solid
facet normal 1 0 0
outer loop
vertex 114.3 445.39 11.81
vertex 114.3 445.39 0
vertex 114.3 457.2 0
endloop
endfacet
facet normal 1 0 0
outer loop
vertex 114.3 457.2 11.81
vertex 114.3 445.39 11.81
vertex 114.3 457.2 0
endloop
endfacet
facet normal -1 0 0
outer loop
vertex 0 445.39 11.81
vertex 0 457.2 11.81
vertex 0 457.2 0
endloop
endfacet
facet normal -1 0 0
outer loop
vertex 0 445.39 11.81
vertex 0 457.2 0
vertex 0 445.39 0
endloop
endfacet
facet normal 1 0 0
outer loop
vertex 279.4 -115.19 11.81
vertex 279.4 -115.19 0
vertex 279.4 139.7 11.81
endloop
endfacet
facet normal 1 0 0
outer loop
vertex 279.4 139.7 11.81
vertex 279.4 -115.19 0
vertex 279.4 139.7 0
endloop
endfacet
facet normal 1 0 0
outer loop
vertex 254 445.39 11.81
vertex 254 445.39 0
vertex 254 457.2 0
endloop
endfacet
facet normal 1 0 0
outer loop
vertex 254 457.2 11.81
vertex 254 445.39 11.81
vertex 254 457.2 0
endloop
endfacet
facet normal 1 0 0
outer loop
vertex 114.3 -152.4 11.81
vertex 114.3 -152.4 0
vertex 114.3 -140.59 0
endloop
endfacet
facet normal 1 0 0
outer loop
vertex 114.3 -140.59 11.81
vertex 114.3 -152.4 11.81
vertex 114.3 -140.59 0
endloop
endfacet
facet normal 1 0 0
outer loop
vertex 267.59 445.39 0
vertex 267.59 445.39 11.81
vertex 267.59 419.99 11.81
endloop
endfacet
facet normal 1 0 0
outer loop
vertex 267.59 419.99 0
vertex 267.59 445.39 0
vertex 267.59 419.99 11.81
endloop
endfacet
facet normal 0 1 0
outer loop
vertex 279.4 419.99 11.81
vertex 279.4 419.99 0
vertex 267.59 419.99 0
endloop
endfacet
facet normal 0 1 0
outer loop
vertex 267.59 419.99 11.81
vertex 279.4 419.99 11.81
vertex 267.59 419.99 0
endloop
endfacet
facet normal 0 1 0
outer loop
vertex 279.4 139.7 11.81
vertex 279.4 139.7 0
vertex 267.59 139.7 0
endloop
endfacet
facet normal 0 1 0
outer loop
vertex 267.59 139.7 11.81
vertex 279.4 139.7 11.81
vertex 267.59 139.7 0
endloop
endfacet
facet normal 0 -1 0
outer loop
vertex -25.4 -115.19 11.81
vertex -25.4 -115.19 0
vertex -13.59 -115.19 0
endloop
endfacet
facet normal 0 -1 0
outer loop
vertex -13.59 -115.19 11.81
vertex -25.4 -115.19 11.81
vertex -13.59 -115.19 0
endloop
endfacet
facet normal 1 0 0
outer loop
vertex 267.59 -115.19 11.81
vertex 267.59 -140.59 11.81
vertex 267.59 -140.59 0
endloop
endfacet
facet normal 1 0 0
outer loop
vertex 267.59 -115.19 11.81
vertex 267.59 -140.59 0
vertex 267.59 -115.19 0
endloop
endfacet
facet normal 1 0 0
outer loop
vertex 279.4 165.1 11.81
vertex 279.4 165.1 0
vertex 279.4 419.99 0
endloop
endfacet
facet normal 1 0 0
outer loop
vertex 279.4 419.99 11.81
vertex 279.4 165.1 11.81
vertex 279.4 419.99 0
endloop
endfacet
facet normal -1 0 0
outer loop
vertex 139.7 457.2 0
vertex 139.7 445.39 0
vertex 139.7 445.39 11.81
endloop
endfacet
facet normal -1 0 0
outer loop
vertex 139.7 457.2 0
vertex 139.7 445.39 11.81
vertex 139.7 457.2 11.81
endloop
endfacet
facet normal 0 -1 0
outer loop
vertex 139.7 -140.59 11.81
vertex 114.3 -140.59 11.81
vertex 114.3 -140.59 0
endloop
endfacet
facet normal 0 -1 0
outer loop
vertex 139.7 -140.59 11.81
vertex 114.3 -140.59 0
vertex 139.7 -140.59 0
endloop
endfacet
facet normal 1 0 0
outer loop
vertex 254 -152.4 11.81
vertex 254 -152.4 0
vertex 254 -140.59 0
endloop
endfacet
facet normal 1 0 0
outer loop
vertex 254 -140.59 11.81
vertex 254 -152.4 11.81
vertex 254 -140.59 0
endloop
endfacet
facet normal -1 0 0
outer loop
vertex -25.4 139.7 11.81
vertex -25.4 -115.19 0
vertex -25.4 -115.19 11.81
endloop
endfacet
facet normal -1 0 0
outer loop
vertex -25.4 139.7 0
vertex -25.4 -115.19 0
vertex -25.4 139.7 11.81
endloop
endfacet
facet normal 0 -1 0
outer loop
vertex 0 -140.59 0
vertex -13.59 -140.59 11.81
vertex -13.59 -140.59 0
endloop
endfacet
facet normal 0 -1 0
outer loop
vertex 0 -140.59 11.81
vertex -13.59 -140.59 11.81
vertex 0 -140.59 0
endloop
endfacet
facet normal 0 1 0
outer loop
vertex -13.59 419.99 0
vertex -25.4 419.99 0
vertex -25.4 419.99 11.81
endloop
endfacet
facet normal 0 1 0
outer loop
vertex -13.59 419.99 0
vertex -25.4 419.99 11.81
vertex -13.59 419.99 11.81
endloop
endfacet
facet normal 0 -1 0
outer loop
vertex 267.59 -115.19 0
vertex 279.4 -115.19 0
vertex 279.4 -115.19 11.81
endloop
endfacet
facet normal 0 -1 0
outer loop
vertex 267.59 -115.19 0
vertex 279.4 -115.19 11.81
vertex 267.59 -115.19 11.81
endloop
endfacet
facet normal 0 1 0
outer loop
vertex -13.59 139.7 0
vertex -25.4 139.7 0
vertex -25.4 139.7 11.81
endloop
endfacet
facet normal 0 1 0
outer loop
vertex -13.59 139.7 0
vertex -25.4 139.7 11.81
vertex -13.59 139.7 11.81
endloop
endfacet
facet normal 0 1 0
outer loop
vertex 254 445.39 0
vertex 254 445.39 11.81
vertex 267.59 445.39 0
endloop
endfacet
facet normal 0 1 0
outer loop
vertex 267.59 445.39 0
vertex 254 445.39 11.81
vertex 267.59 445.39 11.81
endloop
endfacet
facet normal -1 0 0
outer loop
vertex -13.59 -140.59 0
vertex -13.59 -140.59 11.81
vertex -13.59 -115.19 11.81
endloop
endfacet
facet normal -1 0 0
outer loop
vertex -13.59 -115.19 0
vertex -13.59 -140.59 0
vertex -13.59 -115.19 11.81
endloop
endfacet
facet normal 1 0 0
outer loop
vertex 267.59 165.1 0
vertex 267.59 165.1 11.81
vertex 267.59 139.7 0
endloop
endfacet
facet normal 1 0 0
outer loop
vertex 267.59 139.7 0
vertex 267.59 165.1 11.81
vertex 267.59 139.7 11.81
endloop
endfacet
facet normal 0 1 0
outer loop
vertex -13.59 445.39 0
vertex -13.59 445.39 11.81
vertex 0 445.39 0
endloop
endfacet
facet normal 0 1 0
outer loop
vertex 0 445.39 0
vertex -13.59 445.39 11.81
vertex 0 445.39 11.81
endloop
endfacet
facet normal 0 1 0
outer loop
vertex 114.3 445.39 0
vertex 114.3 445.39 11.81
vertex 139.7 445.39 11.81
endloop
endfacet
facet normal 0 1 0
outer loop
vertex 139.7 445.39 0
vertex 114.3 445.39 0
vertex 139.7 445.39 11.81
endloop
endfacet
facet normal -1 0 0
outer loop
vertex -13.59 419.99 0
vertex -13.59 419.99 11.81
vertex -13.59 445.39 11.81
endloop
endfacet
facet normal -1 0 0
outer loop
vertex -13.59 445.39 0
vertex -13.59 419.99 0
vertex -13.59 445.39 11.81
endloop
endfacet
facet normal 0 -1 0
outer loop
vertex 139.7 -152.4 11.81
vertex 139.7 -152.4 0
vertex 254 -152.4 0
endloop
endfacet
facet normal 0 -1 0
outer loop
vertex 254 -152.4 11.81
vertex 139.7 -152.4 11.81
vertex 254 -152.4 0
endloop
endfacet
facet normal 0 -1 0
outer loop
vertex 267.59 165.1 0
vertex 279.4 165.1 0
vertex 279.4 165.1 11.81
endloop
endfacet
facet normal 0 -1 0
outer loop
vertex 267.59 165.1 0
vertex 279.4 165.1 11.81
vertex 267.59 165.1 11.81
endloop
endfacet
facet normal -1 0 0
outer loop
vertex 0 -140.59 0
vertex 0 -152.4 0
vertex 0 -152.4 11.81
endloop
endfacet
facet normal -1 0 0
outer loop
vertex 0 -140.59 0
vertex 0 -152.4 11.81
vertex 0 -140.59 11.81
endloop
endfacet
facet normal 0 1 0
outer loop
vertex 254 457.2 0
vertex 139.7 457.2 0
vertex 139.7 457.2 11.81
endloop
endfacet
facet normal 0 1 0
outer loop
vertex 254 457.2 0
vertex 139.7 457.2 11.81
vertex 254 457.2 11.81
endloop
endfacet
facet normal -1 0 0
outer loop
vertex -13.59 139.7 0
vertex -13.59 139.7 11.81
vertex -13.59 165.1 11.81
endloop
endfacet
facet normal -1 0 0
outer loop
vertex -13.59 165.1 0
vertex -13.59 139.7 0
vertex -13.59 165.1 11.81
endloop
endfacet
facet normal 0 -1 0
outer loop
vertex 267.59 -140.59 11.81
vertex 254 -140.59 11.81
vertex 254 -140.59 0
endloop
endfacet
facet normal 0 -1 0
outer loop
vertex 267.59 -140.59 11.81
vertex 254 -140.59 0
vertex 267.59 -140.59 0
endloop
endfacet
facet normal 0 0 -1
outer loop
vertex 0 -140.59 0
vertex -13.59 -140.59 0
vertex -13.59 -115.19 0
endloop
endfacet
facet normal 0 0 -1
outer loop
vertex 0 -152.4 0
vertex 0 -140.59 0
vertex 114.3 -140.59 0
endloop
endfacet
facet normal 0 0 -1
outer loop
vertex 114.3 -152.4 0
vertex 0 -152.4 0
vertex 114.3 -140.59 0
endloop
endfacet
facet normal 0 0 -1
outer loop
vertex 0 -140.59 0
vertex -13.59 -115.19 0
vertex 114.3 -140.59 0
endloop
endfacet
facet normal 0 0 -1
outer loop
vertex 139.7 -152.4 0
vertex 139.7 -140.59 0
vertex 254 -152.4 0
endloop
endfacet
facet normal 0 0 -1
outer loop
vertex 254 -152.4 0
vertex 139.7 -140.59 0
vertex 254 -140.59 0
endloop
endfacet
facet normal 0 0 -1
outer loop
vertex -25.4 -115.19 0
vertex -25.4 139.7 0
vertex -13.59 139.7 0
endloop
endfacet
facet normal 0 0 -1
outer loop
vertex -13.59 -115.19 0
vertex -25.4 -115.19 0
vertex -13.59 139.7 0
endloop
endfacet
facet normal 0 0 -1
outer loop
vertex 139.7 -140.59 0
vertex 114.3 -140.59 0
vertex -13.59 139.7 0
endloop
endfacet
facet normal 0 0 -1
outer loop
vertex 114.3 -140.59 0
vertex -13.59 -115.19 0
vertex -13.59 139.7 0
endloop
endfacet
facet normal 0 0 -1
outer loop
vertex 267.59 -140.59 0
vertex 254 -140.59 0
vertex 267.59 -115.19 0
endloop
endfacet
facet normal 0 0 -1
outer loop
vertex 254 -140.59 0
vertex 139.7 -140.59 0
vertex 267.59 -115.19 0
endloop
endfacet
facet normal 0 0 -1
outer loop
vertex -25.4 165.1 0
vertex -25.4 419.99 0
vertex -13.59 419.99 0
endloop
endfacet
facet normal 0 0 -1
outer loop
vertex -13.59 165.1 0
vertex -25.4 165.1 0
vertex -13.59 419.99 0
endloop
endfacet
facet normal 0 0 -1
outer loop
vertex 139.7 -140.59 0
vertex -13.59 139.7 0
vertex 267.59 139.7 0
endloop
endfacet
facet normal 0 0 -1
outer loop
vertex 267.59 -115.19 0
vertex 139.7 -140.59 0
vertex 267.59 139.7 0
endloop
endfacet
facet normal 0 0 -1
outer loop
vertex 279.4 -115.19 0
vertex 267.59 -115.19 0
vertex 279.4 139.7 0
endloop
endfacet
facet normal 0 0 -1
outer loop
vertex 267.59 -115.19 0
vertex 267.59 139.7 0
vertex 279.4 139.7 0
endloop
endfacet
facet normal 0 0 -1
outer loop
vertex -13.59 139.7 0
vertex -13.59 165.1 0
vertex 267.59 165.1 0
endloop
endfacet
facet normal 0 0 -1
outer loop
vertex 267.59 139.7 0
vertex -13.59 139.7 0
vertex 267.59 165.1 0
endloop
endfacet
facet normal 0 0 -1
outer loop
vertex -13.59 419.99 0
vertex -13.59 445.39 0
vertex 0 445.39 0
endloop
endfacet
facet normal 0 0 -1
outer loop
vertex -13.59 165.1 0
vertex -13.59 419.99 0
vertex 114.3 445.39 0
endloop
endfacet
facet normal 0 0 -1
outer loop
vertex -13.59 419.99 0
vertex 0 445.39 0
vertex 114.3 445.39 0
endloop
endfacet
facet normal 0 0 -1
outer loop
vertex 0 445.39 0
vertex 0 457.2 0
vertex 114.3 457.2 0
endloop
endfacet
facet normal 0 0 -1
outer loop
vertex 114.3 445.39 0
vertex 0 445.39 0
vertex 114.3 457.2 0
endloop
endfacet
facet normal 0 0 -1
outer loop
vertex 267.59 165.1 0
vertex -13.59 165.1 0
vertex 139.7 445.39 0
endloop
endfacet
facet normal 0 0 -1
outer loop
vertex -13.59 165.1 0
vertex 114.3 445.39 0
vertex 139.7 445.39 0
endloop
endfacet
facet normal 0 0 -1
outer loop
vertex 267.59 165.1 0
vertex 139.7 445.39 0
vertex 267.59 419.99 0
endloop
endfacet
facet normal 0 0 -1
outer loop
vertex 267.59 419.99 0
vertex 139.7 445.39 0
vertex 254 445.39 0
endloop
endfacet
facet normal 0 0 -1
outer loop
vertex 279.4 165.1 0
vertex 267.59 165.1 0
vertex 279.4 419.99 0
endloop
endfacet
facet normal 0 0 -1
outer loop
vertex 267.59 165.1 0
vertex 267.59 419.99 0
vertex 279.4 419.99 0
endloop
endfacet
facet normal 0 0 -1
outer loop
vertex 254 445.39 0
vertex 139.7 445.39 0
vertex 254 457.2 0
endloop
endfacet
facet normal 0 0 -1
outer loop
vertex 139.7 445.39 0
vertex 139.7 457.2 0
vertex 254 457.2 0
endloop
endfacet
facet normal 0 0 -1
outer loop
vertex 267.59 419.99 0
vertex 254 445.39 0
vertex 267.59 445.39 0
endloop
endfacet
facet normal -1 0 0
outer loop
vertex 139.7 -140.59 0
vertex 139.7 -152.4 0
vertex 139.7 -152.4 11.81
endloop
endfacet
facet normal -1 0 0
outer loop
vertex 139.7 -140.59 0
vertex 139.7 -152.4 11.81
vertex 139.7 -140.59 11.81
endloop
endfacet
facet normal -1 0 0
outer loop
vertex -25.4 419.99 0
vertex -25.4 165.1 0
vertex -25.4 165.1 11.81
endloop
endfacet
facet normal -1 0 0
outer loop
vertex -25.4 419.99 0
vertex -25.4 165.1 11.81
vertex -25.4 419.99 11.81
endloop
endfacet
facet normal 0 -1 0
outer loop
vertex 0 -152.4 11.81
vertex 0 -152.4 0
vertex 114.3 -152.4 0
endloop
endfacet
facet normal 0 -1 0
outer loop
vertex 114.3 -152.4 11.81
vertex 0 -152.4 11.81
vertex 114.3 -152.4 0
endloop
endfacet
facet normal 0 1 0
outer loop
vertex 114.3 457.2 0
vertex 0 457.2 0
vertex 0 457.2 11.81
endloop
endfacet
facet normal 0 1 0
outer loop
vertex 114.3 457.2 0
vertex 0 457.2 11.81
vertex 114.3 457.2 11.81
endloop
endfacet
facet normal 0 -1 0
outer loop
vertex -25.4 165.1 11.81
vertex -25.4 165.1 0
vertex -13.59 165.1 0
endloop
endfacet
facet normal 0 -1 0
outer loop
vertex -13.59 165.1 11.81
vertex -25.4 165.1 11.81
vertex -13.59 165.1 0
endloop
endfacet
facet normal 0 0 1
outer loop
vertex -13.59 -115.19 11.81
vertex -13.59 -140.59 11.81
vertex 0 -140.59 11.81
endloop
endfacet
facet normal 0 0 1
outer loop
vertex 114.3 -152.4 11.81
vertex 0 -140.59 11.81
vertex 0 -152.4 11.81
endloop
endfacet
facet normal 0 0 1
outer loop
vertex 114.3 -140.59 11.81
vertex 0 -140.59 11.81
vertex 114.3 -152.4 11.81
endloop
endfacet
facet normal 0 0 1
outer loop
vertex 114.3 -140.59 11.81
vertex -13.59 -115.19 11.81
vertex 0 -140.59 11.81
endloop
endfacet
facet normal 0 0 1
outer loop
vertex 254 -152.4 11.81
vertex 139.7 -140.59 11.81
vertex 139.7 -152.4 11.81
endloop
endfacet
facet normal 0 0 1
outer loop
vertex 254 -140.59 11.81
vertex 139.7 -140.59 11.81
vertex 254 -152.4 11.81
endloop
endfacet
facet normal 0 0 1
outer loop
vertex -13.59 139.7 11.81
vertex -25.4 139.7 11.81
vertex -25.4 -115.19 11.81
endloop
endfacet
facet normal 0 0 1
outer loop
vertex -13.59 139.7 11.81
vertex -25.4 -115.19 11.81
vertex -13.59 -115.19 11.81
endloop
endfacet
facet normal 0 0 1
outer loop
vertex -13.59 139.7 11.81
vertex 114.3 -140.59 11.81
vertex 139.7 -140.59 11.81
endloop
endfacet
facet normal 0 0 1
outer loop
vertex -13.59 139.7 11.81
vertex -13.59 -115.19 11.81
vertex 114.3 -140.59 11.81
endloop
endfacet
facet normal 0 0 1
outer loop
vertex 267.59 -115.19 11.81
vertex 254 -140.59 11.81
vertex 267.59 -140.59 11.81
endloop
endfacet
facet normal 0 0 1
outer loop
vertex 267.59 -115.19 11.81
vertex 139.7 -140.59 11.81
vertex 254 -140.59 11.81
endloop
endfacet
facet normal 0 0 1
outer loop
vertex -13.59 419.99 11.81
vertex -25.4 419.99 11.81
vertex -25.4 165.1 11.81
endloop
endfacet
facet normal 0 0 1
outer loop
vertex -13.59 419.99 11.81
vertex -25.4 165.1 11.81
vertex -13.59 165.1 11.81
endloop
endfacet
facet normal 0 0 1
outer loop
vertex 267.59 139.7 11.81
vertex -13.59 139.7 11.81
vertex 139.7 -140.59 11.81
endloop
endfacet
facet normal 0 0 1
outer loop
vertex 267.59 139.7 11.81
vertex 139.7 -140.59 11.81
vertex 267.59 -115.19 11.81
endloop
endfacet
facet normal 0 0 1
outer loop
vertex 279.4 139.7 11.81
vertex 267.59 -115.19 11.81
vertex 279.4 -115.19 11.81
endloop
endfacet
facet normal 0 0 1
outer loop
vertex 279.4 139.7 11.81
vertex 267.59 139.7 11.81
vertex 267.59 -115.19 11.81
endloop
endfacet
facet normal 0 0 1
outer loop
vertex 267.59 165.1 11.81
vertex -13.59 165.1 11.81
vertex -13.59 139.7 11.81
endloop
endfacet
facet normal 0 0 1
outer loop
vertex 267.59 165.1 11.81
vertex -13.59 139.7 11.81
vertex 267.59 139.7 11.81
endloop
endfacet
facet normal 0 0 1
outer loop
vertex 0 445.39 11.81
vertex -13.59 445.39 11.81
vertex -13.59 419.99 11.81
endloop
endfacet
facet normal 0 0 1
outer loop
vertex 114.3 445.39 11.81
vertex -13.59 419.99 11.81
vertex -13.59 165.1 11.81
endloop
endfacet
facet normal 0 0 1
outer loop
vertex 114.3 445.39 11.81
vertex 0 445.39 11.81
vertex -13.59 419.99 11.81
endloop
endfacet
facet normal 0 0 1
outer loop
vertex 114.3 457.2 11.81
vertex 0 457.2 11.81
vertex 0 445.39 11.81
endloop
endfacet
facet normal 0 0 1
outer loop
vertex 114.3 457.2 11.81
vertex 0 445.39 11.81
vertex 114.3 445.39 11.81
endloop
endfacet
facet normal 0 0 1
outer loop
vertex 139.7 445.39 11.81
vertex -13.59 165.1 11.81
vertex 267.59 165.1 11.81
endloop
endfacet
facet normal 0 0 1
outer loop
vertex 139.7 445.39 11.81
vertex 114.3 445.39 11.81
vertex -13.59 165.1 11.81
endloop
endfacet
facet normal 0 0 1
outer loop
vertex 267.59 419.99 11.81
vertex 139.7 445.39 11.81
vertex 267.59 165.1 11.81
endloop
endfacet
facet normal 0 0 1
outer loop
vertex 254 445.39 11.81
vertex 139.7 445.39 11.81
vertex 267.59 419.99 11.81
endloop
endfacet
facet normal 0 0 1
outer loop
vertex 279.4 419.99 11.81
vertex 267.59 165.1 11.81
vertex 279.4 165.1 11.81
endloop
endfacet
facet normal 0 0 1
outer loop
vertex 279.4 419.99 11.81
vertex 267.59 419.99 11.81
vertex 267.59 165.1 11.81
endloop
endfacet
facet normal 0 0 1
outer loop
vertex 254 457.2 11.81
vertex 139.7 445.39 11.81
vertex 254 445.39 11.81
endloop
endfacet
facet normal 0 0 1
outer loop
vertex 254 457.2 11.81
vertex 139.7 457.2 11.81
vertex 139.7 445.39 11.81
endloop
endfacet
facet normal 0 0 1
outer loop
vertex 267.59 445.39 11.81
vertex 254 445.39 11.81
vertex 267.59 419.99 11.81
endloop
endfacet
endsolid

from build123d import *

# Parameters (mm, degrees)
BASE_SKETCH_W           = 304.8
BASE_SKETCH_H           = 609.6
BOSS_EXTRUDE1_DEPTH     = 11.81
JOINT_X_W               = 25.4
JOINT_X_H               = 11.81
CUT_EXTRUDE1_DEPTH      = 536.943693755
LPATTERN1_COUNT         = 3
LPATTERN1_PITCH         = 139.7
MIRROR1_COPY_1_SKETCH_W = 25.4
MIRROR1_COPY_1_SKETCH_H = 11.81
MIRROR1_COPY_1_DEPTH    = 536.943693755
MIRROR1_COPY_2_SKETCH_W = 25.4
MIRROR1_COPY_2_SKETCH_H = 11.81
MIRROR1_COPY_2_DEPTH    = 536.943693755
JOINT_Y_W               = 11.81
JOINT_Y_H               = 25.4
CUT_EXTRUDE2_DEPTH      = 536.943693755
LPATTERN3_COUNT         = 3
LPATTERN3_PITCH         = 280.29
MIRROR4_COPY_1_SKETCH_W = 11.81
MIRROR4_COPY_1_SKETCH_H = 25.4
MIRROR4_COPY_1_DEPTH    = 536.943693755
MIRROR4_COPY_2_SKETCH_W = 11.81
MIRROR4_COPY_2_SKETCH_H = 25.4
MIRROR4_COPY_2_DEPTH    = 536.943693755


with BuildPart() as part:
    # Base_Sketch → Boss-Extrude1 (new body)
    with BuildSketch(Plane.XY):
        with Locations((127, 152.399963665)):
            Rectangle(BASE_SKETCH_W, BASE_SKETCH_H)
    extrude(amount=BOSS_EXTRUDE1_DEPTH)

    # Joint_X → Cut-Extrude1 (cut, through all)
    with BuildSketch(Plane.XY.offset(11.81)):
        with Locations((-12.7, -146.495036335)):
            Rectangle(JOINT_X_W, JOINT_X_H)
    cut_extrude1 = extrude(amount=-CUT_EXTRUDE1_DEPTH, mode=Mode.SUBTRACT)

    # LPattern1: Cut-Extrude1 ×3
    with Locations(*[(i * LPATTERN1_PITCH, 0, 0) for i in range(1, LPATTERN1_COUNT)]):
        add(cut_extrude1, mode=Mode.SUBTRACT)

    # Mirror1: Cut-Extrude1 across plane
    add(cut_extrude1.mirror(Plane(origin=(0, 152.399963665, 0), x_dir=(0, 0, 1), z_dir=(0, -1, 0))), mode=Mode.SUBTRACT)

    # Mirror1 copy 1 sketch → Mirror1 copy 1 (cut, through all)
    with BuildSketch(Plane(origin=(139.7, 304.79992733, 11.81), x_dir=(1, 0, 0), z_dir=(0, 0, 1))):
        with Locations((-12.7, 146.495036335)):
            Rectangle(MIRROR1_COPY_1_SKETCH_W, MIRROR1_COPY_1_SKETCH_H)
    extrude(amount=-MIRROR1_COPY_1_DEPTH, mode=Mode.SUBTRACT)

    # Mirror1 copy 2 sketch → Mirror1 copy 2 (cut, through all)
    with BuildSketch(Plane(origin=(279.4, 304.79992733, 11.81), x_dir=(1, 0, 0), z_dir=(0, 0, 1))):
        with Locations((-12.7, 146.495036335)):
            Rectangle(MIRROR1_COPY_2_SKETCH_W, MIRROR1_COPY_2_SKETCH_H)
    extrude(amount=-MIRROR1_COPY_2_DEPTH, mode=Mode.SUBTRACT)

    # Joint_Y → Cut-Extrude2 (cut, through all)
    with BuildSketch(Plane.XY.offset(11.81)):
        with Locations((-19.495, -127.890036335)):
            Rectangle(JOINT_Y_W, JOINT_Y_H)
    cut_extrude2 = extrude(amount=-CUT_EXTRUDE2_DEPTH, mode=Mode.SUBTRACT)

    # LPattern3: Cut-Extrude2 ×3
    with Locations(*[(0, i * LPATTERN3_PITCH, 0) for i in range(1, LPATTERN3_COUNT)]):
        add(cut_extrude2, mode=Mode.SUBTRACT)

    # Mirror4: Cut-Extrude2 across plane
    add(cut_extrude2.mirror(Plane.ZY.offset(-127)), mode=Mode.SUBTRACT)

    # Mirror4 copy 1 sketch → Mirror4 copy 1 (cut, through all)
    with BuildSketch(Plane(origin=(254, 280.29, 11.81), x_dir=(-1, 0, 0), z_dir=(0, 0, 1))):
        with Locations((-19.495, 127.890036335)):
            Rectangle(MIRROR4_COPY_1_SKETCH_W, MIRROR4_COPY_1_SKETCH_H)
    extrude(amount=-MIRROR4_COPY_1_DEPTH, mode=Mode.SUBTRACT)

    # Mirror4 copy 2 sketch → Mirror4 copy 2 (cut, through all)
    with BuildSketch(Plane(origin=(254, 560.58, 11.81), x_dir=(-1, 0, 0), z_dir=(0, 0, 1))):
        with Locations((-19.495, 127.890036335)):
            Rectangle(MIRROR4_COPY_2_SKETCH_W, MIRROR4_COPY_2_SKETCH_H)
    extrude(amount=-MIRROR4_COPY_2_DEPTH, mode=Mode.SUBTRACT)


solid = part.part
